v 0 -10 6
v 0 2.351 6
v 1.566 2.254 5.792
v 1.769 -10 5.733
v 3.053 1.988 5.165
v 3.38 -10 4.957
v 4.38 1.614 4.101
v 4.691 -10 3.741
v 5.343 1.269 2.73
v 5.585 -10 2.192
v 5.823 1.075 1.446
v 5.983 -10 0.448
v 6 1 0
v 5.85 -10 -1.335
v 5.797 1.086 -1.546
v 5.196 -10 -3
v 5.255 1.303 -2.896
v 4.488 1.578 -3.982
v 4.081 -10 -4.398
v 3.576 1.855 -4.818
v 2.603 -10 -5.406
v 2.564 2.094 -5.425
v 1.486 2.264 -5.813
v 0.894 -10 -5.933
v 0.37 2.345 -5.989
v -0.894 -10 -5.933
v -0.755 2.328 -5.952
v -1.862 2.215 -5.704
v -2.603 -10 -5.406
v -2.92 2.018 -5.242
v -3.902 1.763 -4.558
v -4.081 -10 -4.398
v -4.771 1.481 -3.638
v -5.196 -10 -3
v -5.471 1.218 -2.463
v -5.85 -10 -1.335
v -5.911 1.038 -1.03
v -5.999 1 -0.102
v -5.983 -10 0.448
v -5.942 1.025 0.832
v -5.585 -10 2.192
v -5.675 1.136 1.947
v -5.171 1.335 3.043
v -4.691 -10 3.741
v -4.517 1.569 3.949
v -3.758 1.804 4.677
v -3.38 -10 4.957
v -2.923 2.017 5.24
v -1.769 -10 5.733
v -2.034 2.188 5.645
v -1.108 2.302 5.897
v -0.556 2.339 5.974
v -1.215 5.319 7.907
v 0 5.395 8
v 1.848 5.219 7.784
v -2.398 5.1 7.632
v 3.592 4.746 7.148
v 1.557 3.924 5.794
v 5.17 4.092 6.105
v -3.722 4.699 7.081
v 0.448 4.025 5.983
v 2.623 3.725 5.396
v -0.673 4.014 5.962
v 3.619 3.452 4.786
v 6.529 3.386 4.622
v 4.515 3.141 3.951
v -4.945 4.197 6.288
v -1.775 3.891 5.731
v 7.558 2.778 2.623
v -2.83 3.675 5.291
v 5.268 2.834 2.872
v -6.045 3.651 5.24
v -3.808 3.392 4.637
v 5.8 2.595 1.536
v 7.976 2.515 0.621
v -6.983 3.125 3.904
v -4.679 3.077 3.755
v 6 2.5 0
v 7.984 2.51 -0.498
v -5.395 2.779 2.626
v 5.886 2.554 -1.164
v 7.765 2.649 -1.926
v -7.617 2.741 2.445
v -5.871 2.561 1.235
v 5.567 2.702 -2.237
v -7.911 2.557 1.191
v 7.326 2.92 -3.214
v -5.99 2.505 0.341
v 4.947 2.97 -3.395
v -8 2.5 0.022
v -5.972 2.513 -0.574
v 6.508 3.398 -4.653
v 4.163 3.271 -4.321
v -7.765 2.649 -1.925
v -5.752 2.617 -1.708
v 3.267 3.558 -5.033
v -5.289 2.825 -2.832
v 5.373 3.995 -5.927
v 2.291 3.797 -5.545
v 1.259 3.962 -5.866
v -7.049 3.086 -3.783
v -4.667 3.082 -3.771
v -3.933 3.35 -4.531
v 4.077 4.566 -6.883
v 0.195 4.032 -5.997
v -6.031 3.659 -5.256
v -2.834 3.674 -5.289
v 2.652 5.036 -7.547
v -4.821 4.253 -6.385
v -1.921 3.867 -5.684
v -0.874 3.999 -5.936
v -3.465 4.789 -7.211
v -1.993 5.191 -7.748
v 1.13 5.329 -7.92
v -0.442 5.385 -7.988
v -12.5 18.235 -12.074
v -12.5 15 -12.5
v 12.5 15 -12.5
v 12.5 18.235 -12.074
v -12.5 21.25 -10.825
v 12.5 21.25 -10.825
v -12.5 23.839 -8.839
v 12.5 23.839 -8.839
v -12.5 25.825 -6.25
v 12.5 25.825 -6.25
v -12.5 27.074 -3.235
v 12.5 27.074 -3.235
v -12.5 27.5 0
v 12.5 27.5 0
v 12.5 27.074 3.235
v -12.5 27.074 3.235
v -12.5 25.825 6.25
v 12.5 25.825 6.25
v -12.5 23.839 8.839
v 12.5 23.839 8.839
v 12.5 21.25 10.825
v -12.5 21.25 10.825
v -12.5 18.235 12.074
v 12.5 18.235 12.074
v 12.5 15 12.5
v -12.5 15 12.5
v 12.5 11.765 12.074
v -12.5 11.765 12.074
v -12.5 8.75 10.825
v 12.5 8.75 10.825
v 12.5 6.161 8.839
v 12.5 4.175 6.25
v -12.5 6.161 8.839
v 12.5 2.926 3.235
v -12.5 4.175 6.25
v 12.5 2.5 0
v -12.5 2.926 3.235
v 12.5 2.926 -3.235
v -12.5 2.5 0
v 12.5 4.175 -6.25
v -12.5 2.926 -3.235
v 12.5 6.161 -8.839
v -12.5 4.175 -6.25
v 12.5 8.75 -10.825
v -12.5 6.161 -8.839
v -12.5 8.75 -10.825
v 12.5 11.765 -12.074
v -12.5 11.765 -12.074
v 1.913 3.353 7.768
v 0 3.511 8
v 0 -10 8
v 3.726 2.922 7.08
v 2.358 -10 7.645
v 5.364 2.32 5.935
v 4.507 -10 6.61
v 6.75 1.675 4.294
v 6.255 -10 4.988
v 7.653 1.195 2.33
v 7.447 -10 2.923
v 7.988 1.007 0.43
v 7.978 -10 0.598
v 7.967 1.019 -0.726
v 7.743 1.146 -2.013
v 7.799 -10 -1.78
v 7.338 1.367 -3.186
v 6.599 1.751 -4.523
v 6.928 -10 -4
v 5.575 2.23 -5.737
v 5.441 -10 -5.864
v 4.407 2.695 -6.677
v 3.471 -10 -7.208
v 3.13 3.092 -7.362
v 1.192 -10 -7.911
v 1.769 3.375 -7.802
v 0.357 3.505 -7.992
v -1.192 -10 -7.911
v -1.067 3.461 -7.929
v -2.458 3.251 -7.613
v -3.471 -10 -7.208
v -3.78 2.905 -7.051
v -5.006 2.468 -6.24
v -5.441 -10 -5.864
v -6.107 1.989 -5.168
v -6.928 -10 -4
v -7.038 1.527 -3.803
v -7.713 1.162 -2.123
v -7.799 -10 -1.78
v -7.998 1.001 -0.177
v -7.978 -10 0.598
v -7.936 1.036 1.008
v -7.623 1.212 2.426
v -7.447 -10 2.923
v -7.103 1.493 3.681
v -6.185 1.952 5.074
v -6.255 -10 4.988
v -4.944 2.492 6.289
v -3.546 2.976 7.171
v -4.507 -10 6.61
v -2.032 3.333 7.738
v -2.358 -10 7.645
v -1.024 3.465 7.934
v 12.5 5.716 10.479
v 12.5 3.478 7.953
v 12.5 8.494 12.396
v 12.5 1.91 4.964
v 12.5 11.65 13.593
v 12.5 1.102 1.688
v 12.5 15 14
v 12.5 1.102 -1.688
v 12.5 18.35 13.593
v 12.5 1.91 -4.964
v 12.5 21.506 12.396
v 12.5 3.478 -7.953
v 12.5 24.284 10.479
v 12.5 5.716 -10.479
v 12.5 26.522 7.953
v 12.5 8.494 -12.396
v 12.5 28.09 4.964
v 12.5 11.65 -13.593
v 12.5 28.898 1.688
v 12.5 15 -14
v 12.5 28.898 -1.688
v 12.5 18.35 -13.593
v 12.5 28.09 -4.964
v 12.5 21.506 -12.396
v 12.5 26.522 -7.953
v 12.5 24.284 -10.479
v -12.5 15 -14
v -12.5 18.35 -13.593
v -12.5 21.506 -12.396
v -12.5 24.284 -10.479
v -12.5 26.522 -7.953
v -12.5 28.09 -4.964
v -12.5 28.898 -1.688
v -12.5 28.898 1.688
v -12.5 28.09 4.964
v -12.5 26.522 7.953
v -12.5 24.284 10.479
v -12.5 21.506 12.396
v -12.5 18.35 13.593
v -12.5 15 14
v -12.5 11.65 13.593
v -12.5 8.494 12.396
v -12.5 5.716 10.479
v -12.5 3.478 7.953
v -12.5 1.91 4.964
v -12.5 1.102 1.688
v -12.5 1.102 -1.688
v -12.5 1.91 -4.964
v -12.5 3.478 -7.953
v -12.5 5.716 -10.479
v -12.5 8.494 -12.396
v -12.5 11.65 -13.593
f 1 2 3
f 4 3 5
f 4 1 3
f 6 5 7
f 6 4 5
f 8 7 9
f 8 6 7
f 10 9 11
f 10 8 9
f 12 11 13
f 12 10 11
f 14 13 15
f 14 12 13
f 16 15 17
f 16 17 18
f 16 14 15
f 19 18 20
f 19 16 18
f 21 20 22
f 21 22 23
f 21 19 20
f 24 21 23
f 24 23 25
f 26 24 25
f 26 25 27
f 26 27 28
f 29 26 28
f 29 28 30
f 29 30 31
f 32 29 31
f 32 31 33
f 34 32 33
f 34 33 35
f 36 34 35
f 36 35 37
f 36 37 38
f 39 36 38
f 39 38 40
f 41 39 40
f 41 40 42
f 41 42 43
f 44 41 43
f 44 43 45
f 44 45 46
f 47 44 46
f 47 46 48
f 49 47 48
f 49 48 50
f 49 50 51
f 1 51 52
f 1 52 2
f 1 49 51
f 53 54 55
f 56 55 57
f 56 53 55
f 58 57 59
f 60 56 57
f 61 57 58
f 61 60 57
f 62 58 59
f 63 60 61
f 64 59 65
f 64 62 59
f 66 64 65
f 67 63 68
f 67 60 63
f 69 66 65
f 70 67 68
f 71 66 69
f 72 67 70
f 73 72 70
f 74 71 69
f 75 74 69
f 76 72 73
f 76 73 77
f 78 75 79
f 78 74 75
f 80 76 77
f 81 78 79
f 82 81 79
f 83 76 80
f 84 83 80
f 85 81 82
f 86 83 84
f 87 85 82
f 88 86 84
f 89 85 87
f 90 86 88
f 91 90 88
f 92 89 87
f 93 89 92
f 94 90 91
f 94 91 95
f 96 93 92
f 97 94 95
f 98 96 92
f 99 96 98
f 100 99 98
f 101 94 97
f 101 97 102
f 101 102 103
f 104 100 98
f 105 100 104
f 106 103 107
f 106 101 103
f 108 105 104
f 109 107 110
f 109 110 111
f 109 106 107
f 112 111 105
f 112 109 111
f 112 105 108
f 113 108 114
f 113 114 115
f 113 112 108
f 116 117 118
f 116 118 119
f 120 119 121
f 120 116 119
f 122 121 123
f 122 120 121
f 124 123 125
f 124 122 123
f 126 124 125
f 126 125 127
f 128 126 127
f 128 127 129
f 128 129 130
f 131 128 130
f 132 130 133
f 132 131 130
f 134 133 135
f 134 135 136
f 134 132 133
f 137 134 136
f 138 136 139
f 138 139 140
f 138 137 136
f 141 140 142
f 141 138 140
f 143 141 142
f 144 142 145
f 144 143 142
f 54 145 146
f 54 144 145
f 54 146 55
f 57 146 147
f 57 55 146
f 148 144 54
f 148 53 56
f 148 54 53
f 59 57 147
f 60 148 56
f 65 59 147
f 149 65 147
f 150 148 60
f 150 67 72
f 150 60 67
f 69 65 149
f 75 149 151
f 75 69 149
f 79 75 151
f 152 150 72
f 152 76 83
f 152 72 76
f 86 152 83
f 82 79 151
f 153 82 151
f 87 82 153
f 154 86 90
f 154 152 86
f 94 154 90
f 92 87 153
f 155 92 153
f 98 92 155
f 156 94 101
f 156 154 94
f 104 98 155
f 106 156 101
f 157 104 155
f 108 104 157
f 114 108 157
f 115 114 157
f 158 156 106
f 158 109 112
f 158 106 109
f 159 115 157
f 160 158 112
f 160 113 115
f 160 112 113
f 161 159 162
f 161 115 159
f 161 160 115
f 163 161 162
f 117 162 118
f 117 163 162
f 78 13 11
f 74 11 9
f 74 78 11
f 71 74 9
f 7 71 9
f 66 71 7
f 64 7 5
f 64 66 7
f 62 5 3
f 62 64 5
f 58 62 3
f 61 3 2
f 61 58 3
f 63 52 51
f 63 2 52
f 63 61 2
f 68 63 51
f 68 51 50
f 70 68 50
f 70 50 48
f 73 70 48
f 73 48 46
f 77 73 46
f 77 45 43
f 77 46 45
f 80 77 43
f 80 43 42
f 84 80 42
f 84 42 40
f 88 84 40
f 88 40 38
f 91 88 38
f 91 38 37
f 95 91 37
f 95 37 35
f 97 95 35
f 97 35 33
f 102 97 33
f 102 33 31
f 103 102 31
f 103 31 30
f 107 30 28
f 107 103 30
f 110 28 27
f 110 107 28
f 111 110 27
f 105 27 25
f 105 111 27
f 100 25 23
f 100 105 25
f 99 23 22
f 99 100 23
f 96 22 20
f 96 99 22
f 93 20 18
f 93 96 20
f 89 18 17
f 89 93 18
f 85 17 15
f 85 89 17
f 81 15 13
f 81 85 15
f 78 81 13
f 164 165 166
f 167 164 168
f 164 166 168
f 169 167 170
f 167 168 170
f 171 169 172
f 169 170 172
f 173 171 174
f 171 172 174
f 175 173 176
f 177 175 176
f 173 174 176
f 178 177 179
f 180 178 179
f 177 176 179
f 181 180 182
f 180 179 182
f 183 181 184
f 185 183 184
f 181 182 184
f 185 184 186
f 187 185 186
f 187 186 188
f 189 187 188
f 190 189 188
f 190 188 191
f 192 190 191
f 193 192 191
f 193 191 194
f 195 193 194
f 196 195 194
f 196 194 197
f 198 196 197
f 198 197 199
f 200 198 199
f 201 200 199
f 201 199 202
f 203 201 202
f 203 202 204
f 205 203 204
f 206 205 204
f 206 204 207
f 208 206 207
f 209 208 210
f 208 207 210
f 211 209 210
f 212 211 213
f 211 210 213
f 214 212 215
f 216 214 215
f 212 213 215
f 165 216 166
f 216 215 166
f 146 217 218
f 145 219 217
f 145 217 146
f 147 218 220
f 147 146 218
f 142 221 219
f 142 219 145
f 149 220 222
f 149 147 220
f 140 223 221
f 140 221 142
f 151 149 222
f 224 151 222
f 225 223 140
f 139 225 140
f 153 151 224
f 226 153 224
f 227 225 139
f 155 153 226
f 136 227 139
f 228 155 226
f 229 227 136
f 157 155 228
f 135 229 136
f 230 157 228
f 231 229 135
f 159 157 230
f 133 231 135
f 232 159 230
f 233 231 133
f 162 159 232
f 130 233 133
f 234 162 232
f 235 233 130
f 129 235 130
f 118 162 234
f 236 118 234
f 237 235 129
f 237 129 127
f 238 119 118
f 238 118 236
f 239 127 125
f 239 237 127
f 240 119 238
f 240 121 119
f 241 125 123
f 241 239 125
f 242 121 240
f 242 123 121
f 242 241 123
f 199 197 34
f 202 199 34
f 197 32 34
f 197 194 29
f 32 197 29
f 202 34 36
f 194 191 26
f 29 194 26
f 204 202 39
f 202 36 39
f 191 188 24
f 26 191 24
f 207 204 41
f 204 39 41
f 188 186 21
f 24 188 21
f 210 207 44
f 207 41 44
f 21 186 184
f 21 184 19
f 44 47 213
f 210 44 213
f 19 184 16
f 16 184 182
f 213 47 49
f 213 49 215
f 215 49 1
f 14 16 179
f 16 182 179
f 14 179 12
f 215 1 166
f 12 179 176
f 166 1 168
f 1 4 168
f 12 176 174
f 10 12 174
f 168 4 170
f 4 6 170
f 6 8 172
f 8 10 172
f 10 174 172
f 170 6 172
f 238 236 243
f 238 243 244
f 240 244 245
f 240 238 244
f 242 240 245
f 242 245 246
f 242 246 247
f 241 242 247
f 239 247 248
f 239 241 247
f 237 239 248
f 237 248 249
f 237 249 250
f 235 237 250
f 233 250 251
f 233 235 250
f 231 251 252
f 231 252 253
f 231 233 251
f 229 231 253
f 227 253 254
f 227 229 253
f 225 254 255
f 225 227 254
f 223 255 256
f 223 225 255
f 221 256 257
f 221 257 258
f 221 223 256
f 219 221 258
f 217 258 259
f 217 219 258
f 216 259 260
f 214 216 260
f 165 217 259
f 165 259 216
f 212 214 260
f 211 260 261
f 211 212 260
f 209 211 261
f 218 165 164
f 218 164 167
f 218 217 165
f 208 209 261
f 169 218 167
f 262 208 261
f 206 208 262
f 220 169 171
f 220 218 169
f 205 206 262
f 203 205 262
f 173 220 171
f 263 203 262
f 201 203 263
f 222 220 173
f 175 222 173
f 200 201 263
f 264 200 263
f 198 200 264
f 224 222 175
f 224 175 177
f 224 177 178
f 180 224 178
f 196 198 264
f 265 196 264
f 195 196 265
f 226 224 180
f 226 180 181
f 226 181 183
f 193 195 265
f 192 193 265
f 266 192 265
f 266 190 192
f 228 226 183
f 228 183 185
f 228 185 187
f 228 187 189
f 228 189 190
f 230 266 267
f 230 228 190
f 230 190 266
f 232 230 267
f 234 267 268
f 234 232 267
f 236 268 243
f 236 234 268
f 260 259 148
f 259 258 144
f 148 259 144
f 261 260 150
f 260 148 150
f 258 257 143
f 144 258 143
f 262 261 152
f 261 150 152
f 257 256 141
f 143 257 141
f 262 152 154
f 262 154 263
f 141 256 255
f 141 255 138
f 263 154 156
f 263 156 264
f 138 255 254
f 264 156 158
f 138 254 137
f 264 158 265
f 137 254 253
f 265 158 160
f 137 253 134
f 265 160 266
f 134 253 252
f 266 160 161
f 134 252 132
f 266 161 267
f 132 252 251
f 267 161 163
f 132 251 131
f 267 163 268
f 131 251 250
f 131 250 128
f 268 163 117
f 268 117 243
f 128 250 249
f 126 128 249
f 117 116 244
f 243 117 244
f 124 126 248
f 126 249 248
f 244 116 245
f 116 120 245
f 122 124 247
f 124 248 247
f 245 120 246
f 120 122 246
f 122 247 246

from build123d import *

# Parameters (mm, degrees)
EXTRUDE_1_DEPTH          = 10
EXTRUDE_1_DEPTH_BACK     = 10
SKETCH_1_R               = 8
SKETCH_1_R_2             = 6
SKETCH_2_R               = 14
SKETCH_2_R_2             = 12.5
EXTRUDE_2_DEPTH          = 12.5
CUT_EXTRUDE_1_DEPTH      = 35.543451059
CUT_EXTRUDE_1_DEPTH_BACK = 35.543451059
SKETCH_3_R               = 12.5
SKETCH_4_R               = 6
CUT_EXTRUDE_2_DEPTH      = 20


with BuildPart() as part:
    # 草图1 → 凸台-拉伸1 (new, two sides: drawn at the far end of the back side and taken through both)
    with BuildSketch(Plane(origin=(0, 0, 0), x_dir=(1, 0, 0), z_dir=(0, 1, 0)).offset(-EXTRUDE_1_DEPTH_BACK)):
        Circle(SKETCH_1_R)
        Circle(SKETCH_1_R_2, mode=Mode.SUBTRACT)
    extrude(amount=EXTRUDE_1_DEPTH + EXTRUDE_1_DEPTH_BACK)

    # 草图2 → 凸台-拉伸2 (add, symmetric)
    with BuildSketch(Plane(origin=(0, 0, 0), x_dir=(0, 0, -1), z_dir=(1, 0, 0))):
        with Locations((0, 15)):
            Circle(SKETCH_2_R)
        with Locations((0, 15)):
            Circle(SKETCH_2_R_2, mode=Mode.SUBTRACT)
    extrude(amount=EXTRUDE_2_DEPTH, both=True)

    # 草图3 → 切除-拉伸1 (cut, two sides: drawn at the far end of the back side and taken through both)
    with BuildSketch(Plane(origin=(0, 0, 0), x_dir=(0, 0, -1), z_dir=(1, 0, 0)).offset(-CUT_EXTRUDE_1_DEPTH_BACK)):
        with Locations((0, 15)):
            Circle(SKETCH_3_R)
    extrude(amount=CUT_EXTRUDE_1_DEPTH + CUT_EXTRUDE_1_DEPTH_BACK, mode=Mode.SUBTRACT)

    # 草图4 → 切除-拉伸2 (cut)
    with BuildSketch(Plane.XZ.offset(10)):
        Circle(SKETCH_4_R)
    extrude(amount=-CUT_EXTRUDE_2_DEPTH, mode=Mode.SUBTRACT)


solid = part.part
